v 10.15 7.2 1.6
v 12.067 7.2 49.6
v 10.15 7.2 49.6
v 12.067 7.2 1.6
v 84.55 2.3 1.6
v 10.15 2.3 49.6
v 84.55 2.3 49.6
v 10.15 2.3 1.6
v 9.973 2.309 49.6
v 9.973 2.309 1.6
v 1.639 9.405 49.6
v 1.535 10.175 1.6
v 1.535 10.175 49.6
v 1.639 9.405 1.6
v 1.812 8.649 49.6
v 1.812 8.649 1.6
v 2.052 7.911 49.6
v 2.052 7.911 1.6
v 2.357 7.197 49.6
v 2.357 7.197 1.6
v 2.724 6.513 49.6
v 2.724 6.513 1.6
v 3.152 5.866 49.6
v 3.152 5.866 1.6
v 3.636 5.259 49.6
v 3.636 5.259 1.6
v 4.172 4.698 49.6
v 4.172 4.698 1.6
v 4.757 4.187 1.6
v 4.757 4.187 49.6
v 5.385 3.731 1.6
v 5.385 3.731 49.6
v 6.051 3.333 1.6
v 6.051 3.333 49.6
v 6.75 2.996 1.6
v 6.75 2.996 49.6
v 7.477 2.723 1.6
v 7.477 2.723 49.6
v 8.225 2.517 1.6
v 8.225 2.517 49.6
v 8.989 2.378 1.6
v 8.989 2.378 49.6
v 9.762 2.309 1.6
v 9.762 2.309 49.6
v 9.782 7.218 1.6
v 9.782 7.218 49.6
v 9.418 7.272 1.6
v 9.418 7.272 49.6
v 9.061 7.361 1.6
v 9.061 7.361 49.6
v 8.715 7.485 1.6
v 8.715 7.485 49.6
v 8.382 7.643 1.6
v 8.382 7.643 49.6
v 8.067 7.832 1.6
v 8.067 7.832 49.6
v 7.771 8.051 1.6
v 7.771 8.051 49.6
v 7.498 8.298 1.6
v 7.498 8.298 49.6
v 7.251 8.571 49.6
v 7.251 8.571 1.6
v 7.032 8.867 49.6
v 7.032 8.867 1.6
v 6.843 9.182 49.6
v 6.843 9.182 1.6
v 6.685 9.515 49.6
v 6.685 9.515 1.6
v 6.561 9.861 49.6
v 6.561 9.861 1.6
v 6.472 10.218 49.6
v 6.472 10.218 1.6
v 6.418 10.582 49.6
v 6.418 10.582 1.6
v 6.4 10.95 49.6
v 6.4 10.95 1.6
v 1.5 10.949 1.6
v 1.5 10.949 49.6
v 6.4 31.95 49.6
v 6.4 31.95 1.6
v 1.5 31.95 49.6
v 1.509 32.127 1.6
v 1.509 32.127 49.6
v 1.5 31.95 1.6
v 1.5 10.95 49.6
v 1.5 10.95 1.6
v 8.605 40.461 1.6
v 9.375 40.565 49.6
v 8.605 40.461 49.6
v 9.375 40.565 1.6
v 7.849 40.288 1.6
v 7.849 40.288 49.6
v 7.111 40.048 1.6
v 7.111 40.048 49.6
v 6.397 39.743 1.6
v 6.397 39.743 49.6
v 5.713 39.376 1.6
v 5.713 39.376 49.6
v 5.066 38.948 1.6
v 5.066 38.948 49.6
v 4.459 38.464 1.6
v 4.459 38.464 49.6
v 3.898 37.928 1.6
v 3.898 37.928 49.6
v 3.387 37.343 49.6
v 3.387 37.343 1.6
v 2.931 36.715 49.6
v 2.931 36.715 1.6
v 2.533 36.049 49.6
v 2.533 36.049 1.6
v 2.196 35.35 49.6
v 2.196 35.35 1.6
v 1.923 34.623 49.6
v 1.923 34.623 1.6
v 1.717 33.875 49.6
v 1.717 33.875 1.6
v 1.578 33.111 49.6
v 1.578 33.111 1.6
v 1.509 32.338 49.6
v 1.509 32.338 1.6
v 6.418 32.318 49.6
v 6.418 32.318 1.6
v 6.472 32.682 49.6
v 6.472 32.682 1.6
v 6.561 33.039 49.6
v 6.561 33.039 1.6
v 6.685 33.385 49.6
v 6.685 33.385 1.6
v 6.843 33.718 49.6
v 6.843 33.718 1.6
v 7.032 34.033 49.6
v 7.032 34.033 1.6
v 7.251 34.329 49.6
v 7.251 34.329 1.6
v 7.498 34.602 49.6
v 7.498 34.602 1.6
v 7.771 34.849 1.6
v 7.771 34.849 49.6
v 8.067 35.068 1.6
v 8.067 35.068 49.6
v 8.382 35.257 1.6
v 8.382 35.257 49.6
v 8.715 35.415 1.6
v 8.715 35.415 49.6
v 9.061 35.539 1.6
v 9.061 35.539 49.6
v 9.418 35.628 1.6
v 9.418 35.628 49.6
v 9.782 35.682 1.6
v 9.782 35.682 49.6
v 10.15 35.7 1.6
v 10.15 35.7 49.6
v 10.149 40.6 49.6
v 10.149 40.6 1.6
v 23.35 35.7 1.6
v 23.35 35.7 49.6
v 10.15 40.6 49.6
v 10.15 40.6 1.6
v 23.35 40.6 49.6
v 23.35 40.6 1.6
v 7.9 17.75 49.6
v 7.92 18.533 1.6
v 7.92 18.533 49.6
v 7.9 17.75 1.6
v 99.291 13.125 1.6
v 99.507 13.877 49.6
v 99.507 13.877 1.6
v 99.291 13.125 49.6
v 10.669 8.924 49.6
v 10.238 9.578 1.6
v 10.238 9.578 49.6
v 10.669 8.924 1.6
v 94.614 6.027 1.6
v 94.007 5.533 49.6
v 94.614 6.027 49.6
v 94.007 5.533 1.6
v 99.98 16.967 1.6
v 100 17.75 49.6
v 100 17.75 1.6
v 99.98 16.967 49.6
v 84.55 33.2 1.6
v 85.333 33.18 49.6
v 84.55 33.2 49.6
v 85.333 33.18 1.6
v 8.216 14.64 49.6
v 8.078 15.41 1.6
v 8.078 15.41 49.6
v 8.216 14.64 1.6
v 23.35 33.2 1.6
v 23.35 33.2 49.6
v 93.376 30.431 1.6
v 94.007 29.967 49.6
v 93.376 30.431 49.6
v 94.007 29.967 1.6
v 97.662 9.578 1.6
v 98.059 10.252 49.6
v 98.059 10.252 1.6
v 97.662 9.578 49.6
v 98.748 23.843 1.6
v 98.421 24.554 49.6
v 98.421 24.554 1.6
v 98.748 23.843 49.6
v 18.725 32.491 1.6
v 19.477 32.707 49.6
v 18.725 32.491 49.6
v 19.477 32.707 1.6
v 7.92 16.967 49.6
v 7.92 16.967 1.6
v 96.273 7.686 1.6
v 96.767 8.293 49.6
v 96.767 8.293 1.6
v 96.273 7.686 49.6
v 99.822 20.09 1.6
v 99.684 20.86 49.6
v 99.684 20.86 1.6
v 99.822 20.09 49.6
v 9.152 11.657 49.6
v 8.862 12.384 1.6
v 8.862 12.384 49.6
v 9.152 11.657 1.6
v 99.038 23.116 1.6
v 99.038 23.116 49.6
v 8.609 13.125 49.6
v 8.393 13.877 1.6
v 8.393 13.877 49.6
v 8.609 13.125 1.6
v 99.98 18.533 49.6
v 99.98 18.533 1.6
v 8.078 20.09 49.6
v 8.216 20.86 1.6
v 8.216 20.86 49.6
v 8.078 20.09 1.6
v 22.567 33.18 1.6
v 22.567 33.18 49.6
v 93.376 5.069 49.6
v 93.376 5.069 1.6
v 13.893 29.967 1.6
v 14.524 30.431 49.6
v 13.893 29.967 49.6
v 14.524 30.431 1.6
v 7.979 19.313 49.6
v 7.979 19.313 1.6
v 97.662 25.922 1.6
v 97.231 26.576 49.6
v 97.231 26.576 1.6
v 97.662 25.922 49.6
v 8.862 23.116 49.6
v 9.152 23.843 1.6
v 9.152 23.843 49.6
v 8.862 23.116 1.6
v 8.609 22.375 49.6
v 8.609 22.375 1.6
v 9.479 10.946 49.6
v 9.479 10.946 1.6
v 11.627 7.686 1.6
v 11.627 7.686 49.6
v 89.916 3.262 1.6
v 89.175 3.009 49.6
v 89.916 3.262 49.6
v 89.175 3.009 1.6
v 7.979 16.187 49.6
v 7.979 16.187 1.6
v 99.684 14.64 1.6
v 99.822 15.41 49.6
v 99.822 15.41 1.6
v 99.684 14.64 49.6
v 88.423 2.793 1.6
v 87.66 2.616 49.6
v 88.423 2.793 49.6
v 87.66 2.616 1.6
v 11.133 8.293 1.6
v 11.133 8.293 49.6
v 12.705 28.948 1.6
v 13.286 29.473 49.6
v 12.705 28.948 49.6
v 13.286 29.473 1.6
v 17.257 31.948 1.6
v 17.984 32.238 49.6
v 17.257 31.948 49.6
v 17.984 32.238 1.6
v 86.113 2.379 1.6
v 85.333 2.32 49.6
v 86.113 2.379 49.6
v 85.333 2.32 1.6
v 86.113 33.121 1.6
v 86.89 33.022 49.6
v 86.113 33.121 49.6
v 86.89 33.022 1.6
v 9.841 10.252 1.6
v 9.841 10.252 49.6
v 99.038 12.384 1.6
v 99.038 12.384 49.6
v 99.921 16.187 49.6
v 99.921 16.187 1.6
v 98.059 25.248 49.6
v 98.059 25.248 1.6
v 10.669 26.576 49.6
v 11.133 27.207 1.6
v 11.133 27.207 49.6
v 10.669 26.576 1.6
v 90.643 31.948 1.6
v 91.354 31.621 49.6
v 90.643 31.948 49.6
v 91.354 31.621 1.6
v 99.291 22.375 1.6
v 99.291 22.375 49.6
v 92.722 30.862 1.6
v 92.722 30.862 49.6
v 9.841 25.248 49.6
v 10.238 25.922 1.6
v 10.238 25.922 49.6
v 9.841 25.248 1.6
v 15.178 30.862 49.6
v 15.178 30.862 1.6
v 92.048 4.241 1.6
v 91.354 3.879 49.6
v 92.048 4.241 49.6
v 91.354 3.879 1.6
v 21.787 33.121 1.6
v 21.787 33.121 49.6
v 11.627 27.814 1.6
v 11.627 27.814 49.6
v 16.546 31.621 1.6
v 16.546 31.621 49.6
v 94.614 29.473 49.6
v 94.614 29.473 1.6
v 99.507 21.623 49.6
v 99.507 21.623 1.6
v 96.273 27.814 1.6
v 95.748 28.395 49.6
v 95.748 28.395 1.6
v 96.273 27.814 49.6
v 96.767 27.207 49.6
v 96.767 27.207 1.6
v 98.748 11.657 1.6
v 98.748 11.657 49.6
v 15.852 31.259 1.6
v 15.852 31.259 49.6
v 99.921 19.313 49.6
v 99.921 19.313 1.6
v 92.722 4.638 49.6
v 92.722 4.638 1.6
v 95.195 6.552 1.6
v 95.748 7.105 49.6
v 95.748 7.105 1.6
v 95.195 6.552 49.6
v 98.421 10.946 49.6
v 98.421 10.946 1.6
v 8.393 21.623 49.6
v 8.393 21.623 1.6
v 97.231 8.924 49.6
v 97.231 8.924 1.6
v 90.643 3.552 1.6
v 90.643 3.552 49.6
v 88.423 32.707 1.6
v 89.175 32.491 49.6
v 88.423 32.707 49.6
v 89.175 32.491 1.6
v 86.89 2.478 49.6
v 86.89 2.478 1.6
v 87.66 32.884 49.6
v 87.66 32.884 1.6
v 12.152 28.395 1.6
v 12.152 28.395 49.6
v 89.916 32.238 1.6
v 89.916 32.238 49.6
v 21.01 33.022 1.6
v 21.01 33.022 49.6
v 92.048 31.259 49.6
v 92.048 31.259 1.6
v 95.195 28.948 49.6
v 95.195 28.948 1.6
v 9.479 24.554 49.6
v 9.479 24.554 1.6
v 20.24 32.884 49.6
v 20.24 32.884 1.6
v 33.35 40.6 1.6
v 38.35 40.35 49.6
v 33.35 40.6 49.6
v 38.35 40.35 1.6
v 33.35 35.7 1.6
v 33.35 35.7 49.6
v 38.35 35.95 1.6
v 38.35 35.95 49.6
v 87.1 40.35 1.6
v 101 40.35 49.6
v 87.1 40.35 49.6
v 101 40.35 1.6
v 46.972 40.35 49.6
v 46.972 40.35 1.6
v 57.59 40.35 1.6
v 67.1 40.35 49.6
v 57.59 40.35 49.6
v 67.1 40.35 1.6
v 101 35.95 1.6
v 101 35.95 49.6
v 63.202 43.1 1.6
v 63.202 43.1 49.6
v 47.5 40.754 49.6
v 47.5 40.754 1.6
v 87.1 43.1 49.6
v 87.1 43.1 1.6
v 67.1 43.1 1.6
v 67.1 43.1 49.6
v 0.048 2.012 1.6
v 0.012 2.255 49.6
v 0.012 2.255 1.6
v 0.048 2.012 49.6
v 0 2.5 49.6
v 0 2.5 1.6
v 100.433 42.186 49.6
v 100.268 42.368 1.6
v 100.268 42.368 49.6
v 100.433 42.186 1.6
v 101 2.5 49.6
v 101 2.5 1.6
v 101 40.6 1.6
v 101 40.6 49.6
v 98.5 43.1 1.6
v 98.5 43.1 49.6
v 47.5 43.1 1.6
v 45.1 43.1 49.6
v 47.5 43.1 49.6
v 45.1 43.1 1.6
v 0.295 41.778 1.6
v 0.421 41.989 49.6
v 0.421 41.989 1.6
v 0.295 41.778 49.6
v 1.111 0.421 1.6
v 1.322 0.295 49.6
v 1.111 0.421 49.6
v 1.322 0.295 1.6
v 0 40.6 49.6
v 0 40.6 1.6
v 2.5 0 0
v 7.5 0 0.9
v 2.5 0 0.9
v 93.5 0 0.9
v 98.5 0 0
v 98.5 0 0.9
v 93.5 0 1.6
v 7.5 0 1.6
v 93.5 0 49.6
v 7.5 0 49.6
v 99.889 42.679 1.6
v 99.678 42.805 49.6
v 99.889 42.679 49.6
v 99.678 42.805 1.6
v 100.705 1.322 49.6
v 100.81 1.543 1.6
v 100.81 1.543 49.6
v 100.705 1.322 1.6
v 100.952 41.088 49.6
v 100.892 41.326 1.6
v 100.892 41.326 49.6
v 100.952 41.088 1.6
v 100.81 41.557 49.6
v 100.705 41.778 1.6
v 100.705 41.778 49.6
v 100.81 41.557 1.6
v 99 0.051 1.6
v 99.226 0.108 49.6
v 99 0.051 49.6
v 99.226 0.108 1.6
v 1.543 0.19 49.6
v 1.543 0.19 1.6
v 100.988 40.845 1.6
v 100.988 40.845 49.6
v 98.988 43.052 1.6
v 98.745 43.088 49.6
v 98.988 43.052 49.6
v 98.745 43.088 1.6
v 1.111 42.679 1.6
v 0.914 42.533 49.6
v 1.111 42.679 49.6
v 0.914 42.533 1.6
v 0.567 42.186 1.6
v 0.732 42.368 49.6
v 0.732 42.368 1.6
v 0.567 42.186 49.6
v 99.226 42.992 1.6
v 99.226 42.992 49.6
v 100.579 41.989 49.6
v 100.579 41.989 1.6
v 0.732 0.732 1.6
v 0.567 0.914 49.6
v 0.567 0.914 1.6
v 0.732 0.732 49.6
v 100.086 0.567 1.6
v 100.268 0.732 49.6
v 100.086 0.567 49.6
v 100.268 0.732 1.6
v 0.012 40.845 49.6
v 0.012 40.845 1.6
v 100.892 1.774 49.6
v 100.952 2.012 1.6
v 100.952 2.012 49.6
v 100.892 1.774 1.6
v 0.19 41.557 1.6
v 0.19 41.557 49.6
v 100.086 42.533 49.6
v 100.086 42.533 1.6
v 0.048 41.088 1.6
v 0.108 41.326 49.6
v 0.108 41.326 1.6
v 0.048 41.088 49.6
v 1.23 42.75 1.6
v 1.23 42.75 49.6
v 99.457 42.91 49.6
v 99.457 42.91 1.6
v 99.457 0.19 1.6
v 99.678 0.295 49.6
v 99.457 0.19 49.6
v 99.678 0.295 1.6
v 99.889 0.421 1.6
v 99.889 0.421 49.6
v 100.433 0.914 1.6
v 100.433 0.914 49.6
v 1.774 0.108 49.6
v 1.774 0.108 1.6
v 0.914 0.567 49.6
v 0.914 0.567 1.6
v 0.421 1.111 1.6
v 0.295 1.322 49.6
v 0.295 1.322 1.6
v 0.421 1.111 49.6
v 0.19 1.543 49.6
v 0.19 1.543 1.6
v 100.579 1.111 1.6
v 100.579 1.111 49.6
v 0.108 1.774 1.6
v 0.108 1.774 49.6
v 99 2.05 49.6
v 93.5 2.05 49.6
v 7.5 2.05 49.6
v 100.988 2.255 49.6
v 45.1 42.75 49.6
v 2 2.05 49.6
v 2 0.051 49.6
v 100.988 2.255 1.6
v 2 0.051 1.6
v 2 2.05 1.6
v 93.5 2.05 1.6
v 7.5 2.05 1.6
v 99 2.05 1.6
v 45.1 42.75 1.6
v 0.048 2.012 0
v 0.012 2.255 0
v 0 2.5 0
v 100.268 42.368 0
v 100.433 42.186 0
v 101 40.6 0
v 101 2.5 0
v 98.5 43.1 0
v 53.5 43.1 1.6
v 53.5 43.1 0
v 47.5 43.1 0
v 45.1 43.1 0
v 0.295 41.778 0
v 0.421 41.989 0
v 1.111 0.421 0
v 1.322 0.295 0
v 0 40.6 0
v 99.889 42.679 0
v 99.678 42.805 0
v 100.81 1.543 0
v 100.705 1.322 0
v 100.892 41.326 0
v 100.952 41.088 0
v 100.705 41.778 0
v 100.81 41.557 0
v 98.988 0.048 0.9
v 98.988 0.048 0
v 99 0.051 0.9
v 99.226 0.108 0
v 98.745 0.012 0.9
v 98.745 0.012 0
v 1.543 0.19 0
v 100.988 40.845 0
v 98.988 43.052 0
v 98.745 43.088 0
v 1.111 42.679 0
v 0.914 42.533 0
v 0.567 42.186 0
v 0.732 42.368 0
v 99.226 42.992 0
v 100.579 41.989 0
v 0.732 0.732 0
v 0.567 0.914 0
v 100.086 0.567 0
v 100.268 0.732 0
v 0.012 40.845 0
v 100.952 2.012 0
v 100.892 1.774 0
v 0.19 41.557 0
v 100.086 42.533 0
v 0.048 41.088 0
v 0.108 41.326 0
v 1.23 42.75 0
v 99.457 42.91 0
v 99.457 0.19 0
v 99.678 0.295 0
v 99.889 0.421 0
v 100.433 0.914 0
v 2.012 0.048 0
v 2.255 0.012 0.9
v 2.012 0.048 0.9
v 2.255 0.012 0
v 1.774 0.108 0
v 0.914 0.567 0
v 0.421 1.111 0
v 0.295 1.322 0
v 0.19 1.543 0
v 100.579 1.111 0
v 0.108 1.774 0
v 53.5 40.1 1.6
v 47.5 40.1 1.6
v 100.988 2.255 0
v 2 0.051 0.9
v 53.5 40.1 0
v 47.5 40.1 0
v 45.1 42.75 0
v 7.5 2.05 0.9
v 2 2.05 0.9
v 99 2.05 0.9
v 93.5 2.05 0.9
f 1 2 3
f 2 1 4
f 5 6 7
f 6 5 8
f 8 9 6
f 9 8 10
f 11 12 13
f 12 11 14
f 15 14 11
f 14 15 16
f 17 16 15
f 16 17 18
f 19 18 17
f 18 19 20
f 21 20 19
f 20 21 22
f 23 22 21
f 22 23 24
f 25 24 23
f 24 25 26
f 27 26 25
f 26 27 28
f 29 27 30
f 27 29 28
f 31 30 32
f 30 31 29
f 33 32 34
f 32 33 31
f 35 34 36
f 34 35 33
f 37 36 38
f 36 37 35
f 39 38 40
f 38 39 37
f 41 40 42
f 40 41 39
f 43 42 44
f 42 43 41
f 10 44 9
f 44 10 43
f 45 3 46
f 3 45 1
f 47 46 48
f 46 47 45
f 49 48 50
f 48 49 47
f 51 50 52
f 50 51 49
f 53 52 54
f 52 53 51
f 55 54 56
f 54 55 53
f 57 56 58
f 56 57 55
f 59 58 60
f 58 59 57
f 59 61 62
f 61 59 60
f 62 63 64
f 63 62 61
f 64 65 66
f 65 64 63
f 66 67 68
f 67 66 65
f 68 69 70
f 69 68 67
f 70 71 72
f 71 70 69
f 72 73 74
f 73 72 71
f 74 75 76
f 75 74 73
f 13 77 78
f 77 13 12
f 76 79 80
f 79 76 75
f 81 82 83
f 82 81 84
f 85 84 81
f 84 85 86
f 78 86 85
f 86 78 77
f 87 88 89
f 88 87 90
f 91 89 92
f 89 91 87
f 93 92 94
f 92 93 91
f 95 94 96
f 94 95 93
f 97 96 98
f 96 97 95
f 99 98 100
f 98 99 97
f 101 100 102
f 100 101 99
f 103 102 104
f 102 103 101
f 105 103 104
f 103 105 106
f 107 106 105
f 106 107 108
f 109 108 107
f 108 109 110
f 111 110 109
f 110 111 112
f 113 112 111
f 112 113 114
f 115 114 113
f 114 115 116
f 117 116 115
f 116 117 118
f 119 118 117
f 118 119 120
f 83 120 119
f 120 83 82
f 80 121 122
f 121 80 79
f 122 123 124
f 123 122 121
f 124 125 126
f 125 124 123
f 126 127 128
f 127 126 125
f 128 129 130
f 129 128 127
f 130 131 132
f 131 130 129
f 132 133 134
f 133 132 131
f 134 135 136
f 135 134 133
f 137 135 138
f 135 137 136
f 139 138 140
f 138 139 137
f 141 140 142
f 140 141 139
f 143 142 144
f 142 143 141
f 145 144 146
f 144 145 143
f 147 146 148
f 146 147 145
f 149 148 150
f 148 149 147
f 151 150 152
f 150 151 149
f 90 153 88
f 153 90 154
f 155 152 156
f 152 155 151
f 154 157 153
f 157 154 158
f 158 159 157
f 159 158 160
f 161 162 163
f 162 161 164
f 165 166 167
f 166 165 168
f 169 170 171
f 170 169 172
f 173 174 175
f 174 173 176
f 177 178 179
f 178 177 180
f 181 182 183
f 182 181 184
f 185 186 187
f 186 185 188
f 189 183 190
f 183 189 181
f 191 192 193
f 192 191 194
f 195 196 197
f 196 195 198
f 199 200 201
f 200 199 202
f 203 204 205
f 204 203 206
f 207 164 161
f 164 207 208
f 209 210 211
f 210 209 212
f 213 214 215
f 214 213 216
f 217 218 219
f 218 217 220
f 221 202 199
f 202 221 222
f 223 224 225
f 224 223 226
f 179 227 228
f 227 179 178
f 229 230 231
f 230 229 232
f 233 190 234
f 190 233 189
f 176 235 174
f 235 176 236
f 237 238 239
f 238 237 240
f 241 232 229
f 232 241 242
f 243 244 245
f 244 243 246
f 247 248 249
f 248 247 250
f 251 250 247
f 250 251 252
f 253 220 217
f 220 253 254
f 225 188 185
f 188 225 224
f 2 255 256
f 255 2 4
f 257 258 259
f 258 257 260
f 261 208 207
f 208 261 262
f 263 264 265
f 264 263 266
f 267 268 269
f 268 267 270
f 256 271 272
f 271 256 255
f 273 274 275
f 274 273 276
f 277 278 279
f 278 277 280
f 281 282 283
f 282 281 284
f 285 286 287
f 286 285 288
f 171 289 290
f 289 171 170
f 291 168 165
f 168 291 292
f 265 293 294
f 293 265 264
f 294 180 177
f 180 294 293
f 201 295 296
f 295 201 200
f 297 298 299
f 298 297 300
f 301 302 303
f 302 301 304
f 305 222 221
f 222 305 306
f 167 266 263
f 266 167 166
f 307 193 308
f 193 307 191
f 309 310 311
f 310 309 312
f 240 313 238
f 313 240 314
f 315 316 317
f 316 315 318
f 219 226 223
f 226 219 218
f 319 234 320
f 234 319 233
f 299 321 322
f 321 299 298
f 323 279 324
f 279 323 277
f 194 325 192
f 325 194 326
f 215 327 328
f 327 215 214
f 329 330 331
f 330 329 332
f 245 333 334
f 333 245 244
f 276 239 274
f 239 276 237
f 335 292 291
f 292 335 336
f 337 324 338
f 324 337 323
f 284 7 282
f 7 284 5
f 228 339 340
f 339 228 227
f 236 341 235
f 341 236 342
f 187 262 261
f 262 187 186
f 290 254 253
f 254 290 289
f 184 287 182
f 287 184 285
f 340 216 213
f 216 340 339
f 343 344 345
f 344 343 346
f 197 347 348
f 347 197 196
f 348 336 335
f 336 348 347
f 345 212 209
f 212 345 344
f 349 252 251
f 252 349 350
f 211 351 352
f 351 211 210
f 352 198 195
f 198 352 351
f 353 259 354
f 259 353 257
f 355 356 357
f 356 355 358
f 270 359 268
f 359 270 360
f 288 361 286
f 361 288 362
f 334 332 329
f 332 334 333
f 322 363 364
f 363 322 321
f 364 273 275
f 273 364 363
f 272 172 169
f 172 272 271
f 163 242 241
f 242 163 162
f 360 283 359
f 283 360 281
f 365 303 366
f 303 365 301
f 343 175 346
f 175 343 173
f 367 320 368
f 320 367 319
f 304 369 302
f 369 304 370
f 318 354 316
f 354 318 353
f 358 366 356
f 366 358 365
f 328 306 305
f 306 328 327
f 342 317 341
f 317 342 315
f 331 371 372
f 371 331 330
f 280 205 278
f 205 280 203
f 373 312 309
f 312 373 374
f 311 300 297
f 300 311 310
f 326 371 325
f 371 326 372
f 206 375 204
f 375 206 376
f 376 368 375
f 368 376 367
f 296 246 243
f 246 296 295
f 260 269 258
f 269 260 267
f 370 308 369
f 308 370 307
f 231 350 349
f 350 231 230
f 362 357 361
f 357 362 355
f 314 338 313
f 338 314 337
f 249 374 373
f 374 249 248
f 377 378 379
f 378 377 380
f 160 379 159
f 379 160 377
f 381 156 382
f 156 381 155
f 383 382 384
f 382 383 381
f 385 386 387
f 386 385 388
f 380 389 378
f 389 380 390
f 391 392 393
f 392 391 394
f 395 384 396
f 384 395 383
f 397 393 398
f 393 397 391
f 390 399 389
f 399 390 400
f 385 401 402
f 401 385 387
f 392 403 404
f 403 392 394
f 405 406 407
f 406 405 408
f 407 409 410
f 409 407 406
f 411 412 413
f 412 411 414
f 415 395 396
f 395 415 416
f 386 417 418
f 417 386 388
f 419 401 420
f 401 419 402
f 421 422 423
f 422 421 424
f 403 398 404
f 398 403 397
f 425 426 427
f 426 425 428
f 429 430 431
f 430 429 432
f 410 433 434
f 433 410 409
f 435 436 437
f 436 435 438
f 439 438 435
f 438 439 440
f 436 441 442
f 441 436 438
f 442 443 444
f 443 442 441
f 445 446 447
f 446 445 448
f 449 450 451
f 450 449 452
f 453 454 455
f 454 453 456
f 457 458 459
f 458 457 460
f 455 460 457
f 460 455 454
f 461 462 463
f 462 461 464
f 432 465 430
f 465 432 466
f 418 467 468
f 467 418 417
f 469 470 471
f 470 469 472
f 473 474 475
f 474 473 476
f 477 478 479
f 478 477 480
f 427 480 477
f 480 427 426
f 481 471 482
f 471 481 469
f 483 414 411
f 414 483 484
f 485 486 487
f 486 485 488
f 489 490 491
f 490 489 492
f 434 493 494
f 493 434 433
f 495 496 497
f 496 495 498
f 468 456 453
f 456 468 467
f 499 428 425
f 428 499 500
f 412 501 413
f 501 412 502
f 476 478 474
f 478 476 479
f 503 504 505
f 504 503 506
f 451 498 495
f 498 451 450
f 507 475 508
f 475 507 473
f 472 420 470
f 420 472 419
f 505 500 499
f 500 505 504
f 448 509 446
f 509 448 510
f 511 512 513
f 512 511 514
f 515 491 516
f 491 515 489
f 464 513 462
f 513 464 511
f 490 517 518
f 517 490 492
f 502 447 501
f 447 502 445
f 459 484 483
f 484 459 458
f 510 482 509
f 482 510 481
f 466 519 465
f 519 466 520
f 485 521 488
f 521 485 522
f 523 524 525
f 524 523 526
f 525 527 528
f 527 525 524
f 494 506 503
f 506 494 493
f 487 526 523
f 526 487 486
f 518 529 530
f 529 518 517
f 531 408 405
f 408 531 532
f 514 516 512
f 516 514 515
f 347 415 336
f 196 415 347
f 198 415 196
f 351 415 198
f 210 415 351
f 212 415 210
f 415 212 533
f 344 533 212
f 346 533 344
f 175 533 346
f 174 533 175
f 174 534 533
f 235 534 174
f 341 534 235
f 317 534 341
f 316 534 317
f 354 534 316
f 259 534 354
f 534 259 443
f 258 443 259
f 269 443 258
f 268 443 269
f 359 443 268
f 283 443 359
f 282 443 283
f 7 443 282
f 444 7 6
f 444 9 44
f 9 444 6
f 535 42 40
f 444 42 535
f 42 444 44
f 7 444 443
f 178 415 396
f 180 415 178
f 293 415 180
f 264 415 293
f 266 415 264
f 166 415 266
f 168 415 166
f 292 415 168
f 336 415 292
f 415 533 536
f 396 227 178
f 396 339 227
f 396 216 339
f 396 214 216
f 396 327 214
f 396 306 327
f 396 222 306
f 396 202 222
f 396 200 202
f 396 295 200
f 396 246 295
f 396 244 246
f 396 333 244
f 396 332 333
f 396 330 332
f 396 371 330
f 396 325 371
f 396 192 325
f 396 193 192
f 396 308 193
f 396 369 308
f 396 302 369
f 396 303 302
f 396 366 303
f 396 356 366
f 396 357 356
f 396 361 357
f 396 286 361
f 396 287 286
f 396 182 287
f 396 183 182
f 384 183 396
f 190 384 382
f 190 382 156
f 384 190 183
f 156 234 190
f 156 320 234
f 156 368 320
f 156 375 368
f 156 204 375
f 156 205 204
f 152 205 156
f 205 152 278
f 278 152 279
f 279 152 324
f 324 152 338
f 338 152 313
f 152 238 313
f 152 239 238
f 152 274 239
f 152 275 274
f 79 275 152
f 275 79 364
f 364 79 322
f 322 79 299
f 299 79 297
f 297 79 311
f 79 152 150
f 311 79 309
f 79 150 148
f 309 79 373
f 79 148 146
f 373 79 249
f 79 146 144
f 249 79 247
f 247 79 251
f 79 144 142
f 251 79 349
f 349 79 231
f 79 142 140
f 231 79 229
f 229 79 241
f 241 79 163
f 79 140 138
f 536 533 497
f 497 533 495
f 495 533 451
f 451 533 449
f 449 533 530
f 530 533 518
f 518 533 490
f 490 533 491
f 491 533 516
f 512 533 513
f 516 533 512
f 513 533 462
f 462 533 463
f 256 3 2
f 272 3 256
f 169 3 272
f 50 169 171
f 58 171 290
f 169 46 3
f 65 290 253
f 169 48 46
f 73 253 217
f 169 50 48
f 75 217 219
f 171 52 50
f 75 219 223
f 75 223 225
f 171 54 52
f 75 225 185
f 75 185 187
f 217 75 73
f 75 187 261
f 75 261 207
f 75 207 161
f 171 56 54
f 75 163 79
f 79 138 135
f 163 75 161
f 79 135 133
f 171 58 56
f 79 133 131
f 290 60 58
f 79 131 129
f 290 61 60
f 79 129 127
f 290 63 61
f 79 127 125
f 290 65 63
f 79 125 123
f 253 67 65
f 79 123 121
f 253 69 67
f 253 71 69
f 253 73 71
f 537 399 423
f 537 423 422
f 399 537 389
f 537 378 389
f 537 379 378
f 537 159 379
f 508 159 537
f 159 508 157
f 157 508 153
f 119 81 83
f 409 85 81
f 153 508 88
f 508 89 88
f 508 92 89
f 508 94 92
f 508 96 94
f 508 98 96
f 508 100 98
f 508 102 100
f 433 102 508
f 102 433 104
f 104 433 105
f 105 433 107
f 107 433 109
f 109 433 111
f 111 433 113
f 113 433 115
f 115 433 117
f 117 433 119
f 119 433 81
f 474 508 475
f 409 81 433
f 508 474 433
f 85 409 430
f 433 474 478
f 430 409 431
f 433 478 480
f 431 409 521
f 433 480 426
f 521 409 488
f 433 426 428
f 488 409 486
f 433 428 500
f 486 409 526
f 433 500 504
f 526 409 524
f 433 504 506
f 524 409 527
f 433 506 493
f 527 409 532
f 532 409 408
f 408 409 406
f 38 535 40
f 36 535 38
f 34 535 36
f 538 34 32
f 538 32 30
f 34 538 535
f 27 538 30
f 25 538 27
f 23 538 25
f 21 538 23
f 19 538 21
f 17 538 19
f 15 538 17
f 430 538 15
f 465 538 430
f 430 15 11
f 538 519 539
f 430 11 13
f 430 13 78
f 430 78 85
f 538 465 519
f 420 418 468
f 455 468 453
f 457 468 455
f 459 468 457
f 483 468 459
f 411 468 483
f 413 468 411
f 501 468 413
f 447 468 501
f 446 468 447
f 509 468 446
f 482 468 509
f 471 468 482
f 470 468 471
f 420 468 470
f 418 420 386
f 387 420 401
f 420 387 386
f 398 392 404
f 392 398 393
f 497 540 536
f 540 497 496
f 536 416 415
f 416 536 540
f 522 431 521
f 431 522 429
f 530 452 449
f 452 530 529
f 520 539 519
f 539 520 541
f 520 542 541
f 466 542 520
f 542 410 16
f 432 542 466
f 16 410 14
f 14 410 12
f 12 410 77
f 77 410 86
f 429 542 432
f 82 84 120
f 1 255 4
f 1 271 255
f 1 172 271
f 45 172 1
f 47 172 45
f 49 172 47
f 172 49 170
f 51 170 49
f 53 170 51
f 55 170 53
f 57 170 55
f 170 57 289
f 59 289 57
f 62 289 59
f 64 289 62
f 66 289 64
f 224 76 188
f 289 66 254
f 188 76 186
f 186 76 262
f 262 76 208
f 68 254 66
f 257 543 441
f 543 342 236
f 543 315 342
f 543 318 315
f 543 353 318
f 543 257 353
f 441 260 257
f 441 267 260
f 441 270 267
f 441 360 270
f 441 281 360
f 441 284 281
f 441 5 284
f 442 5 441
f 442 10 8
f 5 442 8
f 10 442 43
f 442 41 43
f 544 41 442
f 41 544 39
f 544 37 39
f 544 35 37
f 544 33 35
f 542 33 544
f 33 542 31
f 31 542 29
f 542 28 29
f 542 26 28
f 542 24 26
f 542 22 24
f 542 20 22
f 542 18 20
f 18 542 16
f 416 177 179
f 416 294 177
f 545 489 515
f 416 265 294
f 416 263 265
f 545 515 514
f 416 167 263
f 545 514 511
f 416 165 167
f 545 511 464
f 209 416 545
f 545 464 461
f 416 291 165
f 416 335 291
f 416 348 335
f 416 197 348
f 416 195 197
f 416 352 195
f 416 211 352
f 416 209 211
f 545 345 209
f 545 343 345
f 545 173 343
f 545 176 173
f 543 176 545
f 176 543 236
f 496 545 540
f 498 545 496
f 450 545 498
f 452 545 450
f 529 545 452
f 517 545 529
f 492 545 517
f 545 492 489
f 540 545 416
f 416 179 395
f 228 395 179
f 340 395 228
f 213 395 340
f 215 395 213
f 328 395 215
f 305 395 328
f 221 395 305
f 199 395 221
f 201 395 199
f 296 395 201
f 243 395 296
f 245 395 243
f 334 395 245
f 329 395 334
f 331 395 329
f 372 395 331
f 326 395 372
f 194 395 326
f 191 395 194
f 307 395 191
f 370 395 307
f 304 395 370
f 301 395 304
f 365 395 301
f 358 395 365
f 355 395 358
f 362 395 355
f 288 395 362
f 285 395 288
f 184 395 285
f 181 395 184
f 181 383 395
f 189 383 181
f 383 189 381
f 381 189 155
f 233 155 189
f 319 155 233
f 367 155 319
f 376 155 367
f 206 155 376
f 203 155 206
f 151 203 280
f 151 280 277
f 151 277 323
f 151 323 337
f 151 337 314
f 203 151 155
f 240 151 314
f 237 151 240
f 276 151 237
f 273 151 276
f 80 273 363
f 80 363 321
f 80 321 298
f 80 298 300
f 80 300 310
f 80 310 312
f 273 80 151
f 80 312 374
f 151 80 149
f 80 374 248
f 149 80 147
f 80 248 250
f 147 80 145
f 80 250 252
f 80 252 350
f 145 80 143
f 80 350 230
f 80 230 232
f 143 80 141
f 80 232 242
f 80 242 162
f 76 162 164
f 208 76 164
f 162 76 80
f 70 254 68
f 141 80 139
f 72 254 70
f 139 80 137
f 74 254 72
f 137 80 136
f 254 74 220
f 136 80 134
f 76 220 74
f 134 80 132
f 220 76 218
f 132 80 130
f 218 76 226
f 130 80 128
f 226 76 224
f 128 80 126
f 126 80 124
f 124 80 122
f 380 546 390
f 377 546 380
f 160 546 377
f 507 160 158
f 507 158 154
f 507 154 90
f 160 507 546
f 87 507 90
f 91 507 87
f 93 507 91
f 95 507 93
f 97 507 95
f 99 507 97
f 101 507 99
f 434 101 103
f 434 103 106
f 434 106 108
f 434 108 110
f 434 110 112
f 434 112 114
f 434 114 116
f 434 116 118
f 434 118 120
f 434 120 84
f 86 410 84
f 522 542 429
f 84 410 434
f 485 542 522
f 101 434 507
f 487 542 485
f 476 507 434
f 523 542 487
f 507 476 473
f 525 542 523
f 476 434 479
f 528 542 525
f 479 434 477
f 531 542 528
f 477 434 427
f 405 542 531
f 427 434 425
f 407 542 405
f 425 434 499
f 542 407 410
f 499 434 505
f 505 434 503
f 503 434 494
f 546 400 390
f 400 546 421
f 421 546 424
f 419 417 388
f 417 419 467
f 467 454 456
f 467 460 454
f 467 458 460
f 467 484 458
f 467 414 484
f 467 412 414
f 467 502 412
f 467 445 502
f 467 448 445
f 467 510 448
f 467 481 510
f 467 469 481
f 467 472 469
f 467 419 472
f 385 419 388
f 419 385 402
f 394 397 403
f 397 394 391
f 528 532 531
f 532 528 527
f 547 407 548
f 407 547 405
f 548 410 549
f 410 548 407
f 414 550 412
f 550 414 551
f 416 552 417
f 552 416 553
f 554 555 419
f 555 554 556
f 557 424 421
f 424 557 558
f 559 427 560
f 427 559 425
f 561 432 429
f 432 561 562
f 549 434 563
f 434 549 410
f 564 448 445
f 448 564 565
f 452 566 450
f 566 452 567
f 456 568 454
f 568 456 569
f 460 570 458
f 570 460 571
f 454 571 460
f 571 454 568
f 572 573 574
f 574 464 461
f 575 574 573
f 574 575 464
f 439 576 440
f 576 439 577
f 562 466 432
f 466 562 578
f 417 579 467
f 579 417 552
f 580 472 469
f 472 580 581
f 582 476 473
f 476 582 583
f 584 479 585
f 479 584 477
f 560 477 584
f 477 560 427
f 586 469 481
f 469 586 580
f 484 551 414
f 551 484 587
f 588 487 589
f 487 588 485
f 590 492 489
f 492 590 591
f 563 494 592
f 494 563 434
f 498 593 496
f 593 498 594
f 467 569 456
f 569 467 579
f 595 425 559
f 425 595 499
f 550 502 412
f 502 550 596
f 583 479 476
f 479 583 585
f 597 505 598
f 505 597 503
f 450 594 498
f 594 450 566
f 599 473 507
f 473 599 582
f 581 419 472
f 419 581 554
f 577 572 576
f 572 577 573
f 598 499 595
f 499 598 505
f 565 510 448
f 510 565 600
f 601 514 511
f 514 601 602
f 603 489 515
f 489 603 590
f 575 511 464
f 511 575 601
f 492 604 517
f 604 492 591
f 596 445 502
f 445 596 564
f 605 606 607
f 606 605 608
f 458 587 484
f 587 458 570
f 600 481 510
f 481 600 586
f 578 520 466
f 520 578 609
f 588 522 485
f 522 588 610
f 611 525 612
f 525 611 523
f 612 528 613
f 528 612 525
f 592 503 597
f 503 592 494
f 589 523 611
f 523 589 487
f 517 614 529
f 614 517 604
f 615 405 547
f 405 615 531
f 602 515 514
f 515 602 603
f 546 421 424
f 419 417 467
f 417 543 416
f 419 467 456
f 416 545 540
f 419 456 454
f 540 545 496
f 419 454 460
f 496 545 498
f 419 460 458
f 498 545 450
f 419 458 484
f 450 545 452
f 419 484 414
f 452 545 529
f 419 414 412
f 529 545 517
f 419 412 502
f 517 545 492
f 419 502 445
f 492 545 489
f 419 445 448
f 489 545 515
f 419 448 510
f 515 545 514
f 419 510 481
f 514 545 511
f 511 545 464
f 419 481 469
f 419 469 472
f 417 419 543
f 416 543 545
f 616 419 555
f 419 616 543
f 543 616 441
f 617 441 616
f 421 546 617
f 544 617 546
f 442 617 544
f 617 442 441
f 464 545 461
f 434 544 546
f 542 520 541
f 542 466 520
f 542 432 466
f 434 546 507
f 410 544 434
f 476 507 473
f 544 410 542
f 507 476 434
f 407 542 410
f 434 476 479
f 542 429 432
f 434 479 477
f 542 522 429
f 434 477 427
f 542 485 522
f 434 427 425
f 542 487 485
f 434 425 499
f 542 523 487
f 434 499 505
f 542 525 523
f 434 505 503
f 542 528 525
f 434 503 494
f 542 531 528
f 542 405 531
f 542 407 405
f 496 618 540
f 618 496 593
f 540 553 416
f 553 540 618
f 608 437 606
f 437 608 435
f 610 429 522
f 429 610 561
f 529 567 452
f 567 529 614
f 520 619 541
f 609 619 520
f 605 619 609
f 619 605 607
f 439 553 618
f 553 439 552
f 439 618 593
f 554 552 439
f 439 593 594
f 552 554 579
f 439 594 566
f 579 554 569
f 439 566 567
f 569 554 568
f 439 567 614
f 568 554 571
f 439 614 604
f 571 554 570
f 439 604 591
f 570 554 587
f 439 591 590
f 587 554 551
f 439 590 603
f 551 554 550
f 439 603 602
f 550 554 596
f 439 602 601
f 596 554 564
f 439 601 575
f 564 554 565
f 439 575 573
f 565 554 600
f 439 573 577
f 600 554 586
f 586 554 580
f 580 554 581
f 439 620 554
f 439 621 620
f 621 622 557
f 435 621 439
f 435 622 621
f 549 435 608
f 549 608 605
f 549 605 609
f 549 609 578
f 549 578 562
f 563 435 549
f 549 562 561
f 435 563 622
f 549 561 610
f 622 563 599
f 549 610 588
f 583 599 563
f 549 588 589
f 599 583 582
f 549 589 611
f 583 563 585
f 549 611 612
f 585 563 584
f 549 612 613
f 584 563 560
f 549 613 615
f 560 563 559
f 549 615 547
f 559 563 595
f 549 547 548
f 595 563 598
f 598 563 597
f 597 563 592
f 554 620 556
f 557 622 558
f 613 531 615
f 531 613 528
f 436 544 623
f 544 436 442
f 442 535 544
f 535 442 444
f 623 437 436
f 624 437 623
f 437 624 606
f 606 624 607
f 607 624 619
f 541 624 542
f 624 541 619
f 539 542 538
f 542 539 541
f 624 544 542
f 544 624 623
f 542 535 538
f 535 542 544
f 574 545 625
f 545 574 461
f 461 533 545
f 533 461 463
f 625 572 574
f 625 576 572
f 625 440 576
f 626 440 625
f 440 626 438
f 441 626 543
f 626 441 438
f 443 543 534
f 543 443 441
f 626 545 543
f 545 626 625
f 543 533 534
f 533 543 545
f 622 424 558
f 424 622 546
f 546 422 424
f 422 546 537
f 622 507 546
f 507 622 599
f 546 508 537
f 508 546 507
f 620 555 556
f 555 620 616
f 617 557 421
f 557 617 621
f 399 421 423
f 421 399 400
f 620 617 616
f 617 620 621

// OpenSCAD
module Path(){
  translate([0, 0, -0.002])union(){
      translate([0, 0, -0.002])hull(){
          translate([0, 0, -0.002])cylinder(d=4.9,h=49.008,$fn=64);
          translate([-13.2, 0, -0.002])cylinder(d=4.9,h=49.008,$fn=64);
        }

      translate([-13.2, 0, -0.002])linear_extrude(height=49.004)translate([0, 6.2, 0])rotate([0, 0, 180])intersection(){
                difference(){
                  circle(d=17.3,$fn=70);
                  circle(d=7.5,$fn=64);
                }

                polygon(points=[[0, 0], [0, 0.173e2], [0.173e2, 0.1059319481262460518e-14]],convexity=10);
              }

      translate([0, 0, -0.002])hull(){
          translate([-19.4, 6.199999999999998, -0.002])cylinder(d=4.9,h=49.008,$fn=64);
          translate([-19.4, 27.2, -0.002])cylinder(d=4.9,h=49.008,$fn=64);
        }

      translate([-19.4, 27.2, -0.002])linear_extrude(height=49.004)translate([6.2, 0, 0])rotate([0, 0, 90])intersection(){
                difference(){
                  circle(d=17.3,$fn=70);
                  circle(d=7.5,$fn=64);
                }

                polygon(points=[[0, 0], [0, 0.173e2], [0.173e2, 0.1059319481262460518e-14]],convexity=10);
              }

      translate([0, 0, -0.002])hull(){
          translate([-13.200000000000001, 33.4, -0.002])cylinder(d=4.9,h=49.008,$fn=64);
          translate([-7.592810154713589e-16, 33.4, -0.002])cylinder(d=4.9,h=49.008,$fn=64);
        }

    }
}
module GridSegment_extra_w_1_0_extra_len_2_h_1_5_w_2_08_repeat_x_2_repeat_y_1_lid_extra_w_1_0_lid_extra_h_0_4_no_bottom_true(){
  translate([25.85, 25.85, 0])union(){
      translate([0, 0, 45])%linear_extrude(height=1)union(){
            translate([-25.85, -25.85, 0])square([51.7, 51.7]);
            translate([-25.85, -25.85, 0])square([51.7, 51.7]);
            translate([27.85, -25.85, 0])square([51.7, 51.7]);
          }

      translate([0, 0, 41.5])color("blue")linear_extrude(height=3.5)union(){
              translate([-21.6, 22.95, 0])square([43.2, 2.2]);
              translate([-21.6, -25.15, 0])square([43.2, 2.2]);
              translate([22.95, -21.6, 0])square([2.2, 43.2]);
              translate([-25.15, -21.6, 0])square([2.2, 43.2]);
              union(){
                translate([-21.6, 22.95, 0])square([43.2, 2.2]);
                translate([-21.6, -25.15, 0])square([43.2, 2.2]);
                translate([22.95, -21.6, 0])square([2.2, 43.2]);
                translate([-25.15, -21.6, 0])square([2.2, 43.2]);
              }

              translate([53.7, 0, 0])union(){
                  translate([-21.6, 22.95, 0])square([43.2, 2.2]);
                  translate([-21.6, -25.15, 0])square([43.2, 2.2]);
                  translate([22.95, -21.6, 0])square([2.2, 43.2]);
                  translate([-25.15, -21.6, 0])square([2.2, 43.2]);
                }

            }

    }
}
module SmdDispenser_strip_h_48_strip_w_4_0(){
  difference(){
    color("pink")union(){
        translate([0, 0, 1.6])difference(){
            union()linear_extrude(height=48)translate([2.5, 2.5, 0])hull(){
                    circle(d=5,$fn=64);
                    translate([96, 0, 0])circle(d=5,$fn=64);
                    translate([0, 38.1, 0])circle(d=5,$fn=64);
                    translate([96, 38.1, 0])circle(d=5,$fn=64);
                  }

            translate([23.35, 38.15, -0.002])union(){
                translate([7.592810154713589e-16, -33.4, -0.002])union(){
                    translate([0, 0, -0.002])Path();
                    translate([0, 13, 0])hull(){
                        translate([0, 0, -0.1])cylinder(d=30.9,h=49.208,$fn=124);
                        translate([61.2, 0, -0.1])cylinder(d=30.9,h=49.408,$fn=124);
                      }

                  }

                translate([0, 0, -0.004])hull(){
                    translate([0, -2.45, -0.004])cube([10, 4.9, 48.016]);
                    translate([5, -2.2, -0.004])cube([10, 4.4, 48.016]);
                  }

                translate([0, -2.2, -0.004])color("blue")cube([101, 4.4, 48.016]);
                translate([29.75, 0, -0.004])linear_extrude(height=48.008)hull(){
                      translate([7, 12.25, 0])square([18, 0.001]);
                      translate([-9, 0, 0])square([9, 0.001]);
                    }

                translate([43.75, 0, -0.1])cube([20, 14.7, 49.208]);
              }

          }

        union()linear_extrude(height=1.6)translate([2.5, 2.5, 0])hull(){
                circle(d=5,$fn=64);
                translate([96, 0, 0])circle(d=5,$fn=64);
                translate([0, 38.1, 0])circle(d=5,$fn=64);
                translate([96, 38.1, 0])circle(d=5,$fn=64);
              }

      }

    translate([-0.1, 42.75, -0.1])color("silver")cube([45.2, 0.5, 50.8]);
    translate([0, 0, 1])color("SteelBlue")union(){
          translate([2, 0, -0.1])cube([5.5, 2.05, 50.8]);
          translate([93.5, 0, -0.1])cube([5.5, 2.05, 51]);
        }

    translate([0, 0, -5])mirror([])rotate([90, 0, 0])translate([-2.40000000000001, 0, -1.5])GridSegment_extra_w_1_0_extra_len_2_h_1_5_w_2_08_repeat_x_2_repeat_y_1_lid_extra_w_1_0_lid_extra_h_0_4_no_bottom_true();
    translate([47.5, 40.1, -0.002])color("purple")cube([6, 6, 49.608]);
  }
}
$fn=64;
SmdDispenser_strip_h_48_strip_w_4_0();
